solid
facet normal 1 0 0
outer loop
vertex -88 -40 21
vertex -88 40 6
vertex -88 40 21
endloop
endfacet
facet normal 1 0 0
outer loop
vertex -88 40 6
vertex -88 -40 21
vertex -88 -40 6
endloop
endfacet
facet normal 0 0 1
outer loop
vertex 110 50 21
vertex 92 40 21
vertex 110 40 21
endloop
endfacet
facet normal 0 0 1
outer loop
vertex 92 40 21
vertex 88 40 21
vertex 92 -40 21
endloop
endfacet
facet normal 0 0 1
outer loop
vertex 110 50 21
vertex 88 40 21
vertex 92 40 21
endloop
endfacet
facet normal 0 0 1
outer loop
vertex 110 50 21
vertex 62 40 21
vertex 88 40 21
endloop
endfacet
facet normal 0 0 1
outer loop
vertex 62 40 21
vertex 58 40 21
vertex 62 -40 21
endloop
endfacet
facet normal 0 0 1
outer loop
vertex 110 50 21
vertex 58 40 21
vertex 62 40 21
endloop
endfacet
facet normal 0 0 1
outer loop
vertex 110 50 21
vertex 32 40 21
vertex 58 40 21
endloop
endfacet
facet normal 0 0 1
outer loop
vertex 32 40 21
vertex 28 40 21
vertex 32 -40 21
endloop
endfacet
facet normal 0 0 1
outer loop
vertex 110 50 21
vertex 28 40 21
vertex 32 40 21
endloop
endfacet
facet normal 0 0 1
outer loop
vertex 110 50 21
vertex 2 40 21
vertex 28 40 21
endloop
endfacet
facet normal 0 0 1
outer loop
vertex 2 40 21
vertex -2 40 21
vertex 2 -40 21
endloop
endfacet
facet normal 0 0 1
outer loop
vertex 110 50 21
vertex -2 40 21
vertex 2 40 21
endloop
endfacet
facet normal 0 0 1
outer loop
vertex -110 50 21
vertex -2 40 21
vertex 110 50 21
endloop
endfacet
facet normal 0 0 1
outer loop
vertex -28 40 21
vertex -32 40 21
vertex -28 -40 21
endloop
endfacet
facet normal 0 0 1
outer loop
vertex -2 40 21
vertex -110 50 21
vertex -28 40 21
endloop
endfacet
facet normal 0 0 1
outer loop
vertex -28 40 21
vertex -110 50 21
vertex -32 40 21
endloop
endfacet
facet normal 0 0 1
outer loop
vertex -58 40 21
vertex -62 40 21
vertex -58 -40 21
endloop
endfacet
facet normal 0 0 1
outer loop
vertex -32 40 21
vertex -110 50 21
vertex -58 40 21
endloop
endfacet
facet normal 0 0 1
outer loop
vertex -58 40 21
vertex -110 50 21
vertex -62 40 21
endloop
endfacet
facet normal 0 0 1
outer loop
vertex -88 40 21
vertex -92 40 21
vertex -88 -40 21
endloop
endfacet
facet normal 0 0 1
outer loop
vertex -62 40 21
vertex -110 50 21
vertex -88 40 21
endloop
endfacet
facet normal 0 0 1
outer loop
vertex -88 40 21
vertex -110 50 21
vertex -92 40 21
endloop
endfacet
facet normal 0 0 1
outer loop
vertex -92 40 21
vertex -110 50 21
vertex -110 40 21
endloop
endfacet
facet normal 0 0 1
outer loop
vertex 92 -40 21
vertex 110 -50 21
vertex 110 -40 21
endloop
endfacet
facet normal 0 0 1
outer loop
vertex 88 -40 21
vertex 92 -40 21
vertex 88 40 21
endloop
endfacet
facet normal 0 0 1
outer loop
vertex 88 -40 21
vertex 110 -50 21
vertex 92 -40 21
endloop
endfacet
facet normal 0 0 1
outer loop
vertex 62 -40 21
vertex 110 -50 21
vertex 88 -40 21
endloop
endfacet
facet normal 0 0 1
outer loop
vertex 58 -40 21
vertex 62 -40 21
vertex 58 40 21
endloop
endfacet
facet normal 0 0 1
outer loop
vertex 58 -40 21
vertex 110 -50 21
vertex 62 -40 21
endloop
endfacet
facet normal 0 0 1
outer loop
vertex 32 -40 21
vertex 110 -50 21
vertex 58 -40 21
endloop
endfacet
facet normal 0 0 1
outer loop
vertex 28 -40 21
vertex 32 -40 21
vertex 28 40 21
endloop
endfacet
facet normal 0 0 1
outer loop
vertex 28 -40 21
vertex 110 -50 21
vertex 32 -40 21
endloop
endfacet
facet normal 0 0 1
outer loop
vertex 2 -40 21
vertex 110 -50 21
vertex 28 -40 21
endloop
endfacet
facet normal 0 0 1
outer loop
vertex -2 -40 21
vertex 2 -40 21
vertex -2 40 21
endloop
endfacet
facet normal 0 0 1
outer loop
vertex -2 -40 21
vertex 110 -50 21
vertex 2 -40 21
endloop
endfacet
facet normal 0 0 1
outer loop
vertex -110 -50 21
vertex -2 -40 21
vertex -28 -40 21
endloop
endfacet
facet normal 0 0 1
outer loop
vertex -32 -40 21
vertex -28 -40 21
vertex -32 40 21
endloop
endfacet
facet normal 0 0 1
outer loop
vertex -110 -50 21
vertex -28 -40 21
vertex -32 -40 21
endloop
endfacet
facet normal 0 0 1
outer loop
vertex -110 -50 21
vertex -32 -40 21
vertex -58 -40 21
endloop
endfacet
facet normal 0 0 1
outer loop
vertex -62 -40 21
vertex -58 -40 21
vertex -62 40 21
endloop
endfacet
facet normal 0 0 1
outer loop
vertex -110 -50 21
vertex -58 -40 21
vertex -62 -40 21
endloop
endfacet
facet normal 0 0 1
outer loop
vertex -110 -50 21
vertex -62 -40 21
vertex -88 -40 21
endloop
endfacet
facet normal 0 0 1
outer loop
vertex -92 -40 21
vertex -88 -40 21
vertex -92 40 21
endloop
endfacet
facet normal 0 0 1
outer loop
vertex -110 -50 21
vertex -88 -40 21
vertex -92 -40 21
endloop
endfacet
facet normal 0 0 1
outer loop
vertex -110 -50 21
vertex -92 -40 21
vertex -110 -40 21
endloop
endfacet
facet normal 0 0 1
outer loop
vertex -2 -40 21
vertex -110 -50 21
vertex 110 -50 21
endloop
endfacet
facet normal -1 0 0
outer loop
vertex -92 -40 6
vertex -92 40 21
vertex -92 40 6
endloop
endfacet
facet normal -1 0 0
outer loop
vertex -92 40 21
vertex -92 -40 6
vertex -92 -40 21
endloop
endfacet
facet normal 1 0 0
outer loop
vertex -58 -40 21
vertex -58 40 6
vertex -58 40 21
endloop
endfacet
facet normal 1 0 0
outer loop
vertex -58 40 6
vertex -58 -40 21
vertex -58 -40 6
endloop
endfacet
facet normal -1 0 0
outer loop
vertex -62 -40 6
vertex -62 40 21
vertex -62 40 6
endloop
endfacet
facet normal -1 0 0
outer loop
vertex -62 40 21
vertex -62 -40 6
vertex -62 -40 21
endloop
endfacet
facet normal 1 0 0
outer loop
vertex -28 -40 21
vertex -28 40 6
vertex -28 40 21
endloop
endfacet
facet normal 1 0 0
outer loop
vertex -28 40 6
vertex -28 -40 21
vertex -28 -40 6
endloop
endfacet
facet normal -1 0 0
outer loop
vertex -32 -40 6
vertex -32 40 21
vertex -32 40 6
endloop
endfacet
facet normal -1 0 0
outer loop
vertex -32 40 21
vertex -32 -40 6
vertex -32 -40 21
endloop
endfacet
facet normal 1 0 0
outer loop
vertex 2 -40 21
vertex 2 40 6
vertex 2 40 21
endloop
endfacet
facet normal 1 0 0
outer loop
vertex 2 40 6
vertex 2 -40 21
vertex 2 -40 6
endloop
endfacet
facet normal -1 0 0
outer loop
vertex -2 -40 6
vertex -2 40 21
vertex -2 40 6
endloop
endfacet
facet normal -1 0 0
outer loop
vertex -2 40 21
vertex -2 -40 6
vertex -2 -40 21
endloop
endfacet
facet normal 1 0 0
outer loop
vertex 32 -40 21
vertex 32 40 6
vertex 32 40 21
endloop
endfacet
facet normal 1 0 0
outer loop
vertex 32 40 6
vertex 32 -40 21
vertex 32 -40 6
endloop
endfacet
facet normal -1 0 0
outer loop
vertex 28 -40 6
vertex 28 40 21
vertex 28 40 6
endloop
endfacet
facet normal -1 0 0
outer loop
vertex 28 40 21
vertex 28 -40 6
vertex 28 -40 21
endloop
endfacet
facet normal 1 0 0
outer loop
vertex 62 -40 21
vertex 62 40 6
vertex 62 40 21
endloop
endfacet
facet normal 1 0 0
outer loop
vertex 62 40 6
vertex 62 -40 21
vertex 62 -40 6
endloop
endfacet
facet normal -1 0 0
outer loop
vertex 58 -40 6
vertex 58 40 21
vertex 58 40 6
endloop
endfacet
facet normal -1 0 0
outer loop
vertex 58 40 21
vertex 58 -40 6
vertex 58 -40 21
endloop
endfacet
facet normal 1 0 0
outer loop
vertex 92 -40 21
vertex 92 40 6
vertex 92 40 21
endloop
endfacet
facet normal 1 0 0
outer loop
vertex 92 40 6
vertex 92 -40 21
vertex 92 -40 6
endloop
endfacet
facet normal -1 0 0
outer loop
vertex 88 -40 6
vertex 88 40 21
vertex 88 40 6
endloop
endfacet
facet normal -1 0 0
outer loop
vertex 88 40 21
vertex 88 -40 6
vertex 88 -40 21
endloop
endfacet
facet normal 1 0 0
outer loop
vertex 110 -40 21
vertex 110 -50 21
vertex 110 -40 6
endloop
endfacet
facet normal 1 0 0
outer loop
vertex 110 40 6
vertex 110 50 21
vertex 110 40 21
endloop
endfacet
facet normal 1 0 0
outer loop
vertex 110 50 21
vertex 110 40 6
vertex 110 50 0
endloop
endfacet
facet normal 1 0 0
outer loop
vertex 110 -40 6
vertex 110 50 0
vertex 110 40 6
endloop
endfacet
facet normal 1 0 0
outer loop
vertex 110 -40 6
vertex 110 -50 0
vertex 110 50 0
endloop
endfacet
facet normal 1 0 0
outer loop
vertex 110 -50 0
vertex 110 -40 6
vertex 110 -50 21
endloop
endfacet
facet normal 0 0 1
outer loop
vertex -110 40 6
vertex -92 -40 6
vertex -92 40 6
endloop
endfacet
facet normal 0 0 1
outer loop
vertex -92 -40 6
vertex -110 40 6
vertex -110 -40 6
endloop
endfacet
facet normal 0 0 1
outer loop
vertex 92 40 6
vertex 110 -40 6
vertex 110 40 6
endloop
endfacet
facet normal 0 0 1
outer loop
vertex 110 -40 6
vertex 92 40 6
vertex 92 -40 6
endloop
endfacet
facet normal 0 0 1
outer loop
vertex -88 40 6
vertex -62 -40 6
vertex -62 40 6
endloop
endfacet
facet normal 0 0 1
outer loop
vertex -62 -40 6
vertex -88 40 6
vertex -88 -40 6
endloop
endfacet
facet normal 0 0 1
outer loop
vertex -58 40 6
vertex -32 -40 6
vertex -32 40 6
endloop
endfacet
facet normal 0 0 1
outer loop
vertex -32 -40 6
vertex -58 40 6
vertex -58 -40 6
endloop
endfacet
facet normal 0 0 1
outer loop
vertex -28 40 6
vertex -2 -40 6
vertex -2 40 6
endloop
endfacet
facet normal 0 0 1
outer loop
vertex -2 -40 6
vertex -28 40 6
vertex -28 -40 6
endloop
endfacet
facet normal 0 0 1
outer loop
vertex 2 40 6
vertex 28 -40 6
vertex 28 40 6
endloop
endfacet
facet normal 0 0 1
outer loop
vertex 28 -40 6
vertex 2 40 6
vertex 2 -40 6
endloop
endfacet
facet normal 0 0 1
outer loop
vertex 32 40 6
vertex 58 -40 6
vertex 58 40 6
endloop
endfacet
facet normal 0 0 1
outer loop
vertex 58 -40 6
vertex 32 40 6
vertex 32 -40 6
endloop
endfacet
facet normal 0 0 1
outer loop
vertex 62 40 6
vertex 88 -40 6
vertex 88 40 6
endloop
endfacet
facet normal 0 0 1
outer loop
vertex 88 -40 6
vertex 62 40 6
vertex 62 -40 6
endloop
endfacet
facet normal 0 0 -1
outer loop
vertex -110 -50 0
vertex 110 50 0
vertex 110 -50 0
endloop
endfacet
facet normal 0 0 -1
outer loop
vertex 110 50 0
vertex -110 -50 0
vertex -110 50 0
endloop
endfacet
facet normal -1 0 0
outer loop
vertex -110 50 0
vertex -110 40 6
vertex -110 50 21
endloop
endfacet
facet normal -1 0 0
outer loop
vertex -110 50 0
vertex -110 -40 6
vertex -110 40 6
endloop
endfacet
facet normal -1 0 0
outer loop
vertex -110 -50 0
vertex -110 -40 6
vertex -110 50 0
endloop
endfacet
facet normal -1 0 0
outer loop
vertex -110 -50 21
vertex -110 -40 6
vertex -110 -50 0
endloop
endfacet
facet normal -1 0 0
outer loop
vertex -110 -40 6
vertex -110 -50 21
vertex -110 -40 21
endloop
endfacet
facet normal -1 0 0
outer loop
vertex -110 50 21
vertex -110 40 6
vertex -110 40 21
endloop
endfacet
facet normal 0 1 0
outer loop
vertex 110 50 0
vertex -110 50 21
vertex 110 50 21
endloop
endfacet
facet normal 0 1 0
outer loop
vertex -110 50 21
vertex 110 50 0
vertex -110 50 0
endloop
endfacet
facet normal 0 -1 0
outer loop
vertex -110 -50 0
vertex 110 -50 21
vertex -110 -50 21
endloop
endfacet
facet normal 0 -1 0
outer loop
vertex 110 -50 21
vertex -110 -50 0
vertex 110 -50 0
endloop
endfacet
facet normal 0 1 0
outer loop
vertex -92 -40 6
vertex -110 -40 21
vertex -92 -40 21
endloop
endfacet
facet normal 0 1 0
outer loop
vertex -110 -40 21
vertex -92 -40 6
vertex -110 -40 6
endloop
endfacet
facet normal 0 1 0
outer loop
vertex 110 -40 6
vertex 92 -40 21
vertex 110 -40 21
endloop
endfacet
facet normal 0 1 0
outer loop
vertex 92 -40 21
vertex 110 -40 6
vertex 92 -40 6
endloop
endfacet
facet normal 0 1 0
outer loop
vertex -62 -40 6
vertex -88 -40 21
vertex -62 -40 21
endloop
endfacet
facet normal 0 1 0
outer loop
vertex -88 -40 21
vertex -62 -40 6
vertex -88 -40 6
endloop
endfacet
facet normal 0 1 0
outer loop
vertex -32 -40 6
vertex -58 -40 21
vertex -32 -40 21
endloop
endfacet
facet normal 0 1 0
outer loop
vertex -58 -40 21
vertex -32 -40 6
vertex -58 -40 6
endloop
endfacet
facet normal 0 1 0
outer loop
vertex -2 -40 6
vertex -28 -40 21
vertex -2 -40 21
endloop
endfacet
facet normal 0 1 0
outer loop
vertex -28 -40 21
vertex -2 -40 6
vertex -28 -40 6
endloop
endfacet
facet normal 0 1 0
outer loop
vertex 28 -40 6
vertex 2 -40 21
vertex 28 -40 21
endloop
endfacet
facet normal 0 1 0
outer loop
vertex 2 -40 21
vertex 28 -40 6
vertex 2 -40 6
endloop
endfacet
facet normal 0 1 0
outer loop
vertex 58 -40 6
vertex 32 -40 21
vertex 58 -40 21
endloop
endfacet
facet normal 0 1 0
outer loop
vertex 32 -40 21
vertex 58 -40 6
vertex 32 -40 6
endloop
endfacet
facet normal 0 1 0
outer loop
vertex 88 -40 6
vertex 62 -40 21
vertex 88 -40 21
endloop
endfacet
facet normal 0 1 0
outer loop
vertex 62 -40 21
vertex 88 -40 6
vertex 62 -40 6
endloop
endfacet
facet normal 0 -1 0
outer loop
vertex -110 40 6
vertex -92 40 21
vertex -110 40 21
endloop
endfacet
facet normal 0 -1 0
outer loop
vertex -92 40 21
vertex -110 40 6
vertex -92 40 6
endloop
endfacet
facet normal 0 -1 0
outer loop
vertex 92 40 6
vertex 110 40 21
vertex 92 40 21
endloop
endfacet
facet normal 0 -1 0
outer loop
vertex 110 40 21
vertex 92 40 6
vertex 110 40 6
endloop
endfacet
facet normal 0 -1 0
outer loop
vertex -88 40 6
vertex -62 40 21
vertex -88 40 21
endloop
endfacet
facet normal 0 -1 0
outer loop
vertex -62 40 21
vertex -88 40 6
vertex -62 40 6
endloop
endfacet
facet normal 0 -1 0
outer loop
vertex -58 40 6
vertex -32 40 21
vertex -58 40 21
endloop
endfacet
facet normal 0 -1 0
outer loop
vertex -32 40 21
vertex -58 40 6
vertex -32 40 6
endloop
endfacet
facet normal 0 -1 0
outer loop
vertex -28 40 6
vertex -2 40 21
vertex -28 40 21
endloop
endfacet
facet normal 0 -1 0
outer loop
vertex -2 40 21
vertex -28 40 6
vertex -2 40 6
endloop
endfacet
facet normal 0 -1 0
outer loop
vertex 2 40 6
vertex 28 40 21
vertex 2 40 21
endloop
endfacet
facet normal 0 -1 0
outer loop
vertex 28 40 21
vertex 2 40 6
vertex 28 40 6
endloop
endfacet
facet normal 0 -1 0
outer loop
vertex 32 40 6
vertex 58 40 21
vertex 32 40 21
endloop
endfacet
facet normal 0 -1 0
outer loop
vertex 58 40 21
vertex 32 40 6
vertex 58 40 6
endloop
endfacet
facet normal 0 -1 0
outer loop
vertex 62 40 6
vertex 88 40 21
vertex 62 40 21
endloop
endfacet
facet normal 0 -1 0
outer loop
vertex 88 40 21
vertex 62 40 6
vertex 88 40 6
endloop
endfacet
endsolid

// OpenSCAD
$fn = 32;

// ----------------------------------------------------------------------
// Rib frame 220 x 100 x 21
// 7 ribs at 30 mm pitch
// ----------------------------------------------------------------------

// --- parameters (mm) ---
frame = [220, 100, 6];  // base plate size (x, y, z)
rail_w = 10;            // side rail width
ribs = 7;               // number of ribs
rib_t = 4;              // rib thickness
rib_h = 15;             // rib height above the base plate
pitch = 30;             // pitch between rib centres

// --- derived feature positions (mm) ---
span = (ribs - 1) * pitch;          // = 180   distance between the outer ribs
origin_x = -span / 2;               // = -90   X of the first rib
rib_len = frame[1] - 2 * rail_w + 2;  // = 82   rib length, 1 mm into each rail
feature_centers = [
  [origin_x + 0 * pitch, 0],
  [origin_x + 1 * pitch, 0],
  [origin_x + 2 * pitch, 0],
  [origin_x + 3 * pitch, 0],
  [origin_x + 4 * pitch, 0],
  [origin_x + 5 * pitch, 0],
  [origin_x + 6 * pitch, 0]
];   // rib centre line, drives the rib loop

// base plate, two side rails, then the ribs read straight off feature_centers
union() {
  translate([-frame[0] / 2, -frame[1] / 2, 0]) cube(frame);
  translate([-frame[0] / 2, -frame[1] / 2, 0]) cube([frame[0], rail_w, frame[2] + rib_h]);
  translate([-frame[0] / 2, frame[1] / 2 - rail_w, 0]) cube([frame[0], rail_w, frame[2] + rib_h]);
  for (centre = feature_centers)
    translate([centre[0] - rib_t / 2, centre[1] - rib_len / 2, frame[2] - 1])
      cube([rib_t, rib_len, rib_h + 1]);
}
